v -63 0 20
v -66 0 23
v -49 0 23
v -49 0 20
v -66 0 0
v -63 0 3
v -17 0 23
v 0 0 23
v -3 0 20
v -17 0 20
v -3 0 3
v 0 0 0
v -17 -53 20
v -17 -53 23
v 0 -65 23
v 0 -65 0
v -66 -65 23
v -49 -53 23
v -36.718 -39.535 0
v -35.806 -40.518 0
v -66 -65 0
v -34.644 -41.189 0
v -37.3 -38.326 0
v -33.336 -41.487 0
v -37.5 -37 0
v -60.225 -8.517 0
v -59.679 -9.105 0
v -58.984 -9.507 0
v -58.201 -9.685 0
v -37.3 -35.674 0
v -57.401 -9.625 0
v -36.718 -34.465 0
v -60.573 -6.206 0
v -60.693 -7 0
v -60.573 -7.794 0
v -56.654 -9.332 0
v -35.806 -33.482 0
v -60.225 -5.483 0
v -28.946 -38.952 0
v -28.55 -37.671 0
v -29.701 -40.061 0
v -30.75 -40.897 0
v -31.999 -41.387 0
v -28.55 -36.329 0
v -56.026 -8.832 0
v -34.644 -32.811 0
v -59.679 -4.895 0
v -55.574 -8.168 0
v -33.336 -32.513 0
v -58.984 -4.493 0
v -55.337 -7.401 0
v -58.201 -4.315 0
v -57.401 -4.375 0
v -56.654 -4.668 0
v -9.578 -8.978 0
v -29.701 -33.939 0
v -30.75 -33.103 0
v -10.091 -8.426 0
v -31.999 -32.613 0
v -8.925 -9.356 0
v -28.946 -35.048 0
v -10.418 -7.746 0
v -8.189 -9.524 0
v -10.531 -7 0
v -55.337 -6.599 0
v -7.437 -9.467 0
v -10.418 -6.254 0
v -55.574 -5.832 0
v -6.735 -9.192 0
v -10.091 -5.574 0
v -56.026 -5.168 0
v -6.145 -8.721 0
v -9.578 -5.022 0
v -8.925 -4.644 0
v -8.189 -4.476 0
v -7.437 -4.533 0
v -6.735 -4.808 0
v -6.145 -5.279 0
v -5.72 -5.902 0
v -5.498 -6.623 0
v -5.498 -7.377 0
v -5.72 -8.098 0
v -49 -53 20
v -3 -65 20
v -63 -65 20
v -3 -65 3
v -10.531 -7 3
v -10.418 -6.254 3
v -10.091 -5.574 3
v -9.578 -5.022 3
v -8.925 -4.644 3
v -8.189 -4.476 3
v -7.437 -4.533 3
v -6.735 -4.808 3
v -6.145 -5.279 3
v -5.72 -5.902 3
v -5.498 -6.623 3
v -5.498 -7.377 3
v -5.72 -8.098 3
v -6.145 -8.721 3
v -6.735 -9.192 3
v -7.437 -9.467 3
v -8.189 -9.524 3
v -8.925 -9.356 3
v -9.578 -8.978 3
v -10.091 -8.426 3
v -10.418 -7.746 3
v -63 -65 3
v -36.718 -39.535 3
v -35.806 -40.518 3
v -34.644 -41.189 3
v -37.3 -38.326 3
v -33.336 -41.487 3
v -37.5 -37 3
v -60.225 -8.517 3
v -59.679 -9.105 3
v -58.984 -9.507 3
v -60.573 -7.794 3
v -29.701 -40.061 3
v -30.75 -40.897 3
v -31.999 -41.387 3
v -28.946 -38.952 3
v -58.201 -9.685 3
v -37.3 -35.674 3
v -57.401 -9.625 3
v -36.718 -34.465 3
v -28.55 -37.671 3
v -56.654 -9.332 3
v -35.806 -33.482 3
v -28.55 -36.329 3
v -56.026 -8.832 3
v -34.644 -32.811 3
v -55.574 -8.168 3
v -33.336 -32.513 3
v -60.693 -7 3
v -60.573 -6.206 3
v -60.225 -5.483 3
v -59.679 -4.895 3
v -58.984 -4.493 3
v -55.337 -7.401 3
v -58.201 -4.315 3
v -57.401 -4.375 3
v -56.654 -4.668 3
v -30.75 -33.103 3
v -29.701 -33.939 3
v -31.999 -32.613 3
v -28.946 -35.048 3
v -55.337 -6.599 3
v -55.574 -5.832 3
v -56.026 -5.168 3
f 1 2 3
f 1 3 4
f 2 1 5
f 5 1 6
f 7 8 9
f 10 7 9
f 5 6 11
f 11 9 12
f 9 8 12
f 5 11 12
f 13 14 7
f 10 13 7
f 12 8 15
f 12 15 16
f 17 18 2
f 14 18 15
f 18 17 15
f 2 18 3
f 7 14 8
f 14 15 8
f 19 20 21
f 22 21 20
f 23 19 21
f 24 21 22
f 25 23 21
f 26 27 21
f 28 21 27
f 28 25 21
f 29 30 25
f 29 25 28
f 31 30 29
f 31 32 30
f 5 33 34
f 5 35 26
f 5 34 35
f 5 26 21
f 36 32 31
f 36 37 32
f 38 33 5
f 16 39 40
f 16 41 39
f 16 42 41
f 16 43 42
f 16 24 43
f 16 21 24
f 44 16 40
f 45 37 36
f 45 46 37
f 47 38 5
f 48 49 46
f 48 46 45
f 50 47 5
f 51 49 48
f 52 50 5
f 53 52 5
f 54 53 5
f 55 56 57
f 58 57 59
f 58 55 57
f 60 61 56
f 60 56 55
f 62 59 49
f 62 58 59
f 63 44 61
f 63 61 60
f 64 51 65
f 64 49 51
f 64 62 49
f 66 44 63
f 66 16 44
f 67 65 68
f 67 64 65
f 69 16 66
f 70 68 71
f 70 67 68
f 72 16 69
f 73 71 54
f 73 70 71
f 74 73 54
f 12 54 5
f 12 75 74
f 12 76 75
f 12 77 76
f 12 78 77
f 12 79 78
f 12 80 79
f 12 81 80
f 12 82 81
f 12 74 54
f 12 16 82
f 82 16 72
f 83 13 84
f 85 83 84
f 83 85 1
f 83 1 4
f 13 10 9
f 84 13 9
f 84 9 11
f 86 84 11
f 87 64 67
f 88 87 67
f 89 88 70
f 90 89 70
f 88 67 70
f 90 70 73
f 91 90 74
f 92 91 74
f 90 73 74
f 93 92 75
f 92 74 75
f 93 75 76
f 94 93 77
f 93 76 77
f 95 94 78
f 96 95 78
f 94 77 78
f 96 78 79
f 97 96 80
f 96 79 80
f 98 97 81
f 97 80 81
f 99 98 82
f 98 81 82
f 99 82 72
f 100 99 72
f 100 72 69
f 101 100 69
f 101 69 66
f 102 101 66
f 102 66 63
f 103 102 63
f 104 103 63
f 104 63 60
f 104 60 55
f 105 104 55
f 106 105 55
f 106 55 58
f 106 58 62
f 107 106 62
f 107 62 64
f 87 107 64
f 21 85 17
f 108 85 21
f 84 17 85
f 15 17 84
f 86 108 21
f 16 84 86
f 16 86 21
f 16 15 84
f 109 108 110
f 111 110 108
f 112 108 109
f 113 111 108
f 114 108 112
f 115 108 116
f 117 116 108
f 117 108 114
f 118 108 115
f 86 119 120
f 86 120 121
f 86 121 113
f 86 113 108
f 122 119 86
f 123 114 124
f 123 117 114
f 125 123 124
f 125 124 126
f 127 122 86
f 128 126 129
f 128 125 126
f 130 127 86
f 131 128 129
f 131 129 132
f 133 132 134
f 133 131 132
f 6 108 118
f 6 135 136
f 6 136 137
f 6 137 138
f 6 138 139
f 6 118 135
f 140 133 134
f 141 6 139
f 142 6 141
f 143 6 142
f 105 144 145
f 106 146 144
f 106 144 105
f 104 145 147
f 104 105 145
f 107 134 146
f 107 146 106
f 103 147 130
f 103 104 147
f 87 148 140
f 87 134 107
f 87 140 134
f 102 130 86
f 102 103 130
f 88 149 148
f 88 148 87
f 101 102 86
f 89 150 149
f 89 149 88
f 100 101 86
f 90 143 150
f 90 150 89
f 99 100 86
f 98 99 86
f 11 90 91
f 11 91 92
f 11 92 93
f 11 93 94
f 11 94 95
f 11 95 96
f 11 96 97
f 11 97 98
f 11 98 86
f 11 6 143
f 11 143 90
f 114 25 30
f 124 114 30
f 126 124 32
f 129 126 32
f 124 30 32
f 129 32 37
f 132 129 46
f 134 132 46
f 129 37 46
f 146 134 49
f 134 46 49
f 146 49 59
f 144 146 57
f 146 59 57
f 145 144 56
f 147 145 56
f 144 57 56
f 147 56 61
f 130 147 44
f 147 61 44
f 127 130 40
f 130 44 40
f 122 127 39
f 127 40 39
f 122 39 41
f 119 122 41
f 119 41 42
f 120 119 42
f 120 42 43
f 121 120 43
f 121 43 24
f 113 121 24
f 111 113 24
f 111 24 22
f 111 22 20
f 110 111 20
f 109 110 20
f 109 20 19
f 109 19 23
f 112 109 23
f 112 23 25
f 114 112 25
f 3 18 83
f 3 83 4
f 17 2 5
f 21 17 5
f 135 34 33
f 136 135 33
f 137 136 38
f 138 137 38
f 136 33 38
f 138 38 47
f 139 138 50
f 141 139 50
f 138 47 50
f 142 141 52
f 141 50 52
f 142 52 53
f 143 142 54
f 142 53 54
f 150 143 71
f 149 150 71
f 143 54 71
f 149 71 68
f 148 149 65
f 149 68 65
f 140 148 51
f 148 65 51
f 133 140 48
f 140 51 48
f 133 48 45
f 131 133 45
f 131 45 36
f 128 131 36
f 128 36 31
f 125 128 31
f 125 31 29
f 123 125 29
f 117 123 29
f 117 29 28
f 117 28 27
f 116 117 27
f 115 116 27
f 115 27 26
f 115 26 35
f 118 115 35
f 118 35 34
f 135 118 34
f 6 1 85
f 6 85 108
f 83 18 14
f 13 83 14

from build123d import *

# Parameters (mm, degrees)
SKETCH1_W           = 23
SKETCH1_H           = 65
BOSS_EXTRUDE1_DEPTH = 66
SKETCH2_W           = 60
SKETCH2_H           = 17
CUT_EXTRUDE1_DEPTH  = 66
CUT_EXTRUDE2_REACH  = 25
SKETCH3_W           = 32
SKETCH3_H           = 53
CUT_EXTRUDE3_REACH  = 25
SKETCH5_R           = 4.5
SKETCH5_R_2         = 2.530586218
SKETCH5_R_3         = 2.69284222


with BuildPart() as part:
    # Sketch1 → Boss-Extrude1 (new body)
    with BuildSketch(Plane(origin=(0, 0, 0), x_dir=(0, 0, -1), z_dir=(1, 0, 0))):
        with Locations((-11.5, -32.5)):
            Rectangle(SKETCH1_W, SKETCH1_H)
    extrude(amount=-BOSS_EXTRUDE1_DEPTH)

    # Sketch2 → Cut-Extrude1 (cut, through all)
    with BuildSketch(Plane(origin=(0, 0, 0), x_dir=(1, 0, 0), z_dir=(0, 1, 0))):
        with Locations((-33, -11.5)):
            Rectangle(SKETCH2_W, SKETCH2_H)
    extrude(amount=-CUT_EXTRUDE1_DEPTH, mode=Mode.SUBTRACT)

    # Sketch3 → Cut-Extrude2 (cut, up to next)
    with BuildSketch(Plane.XY.offset(23), mode=Mode.PRIVATE) as cut_extrude2_sk1:
        with Locations((-33, -26.5)):
            Rectangle(SKETCH3_W, SKETCH3_H)
    cut_extrude2_tool1 = extrude(cut_extrude2_sk1.sketch, amount=-CUT_EXTRUDE2_REACH, mode=Mode.PRIVATE) & part.part
    add(cut_extrude2_tool1.solids().sort_by_distance((-33, -26.5, 23))[0], mode=Mode.SUBTRACT)

    # Sketch5 → Cut-Extrude3 (cut, up to next)
    with BuildSketch(Plane(origin=(0, 0, 0), x_dir=(-1, 0, 0), z_dir=(0, 0, -1)), mode=Mode.PRIVATE) as cut_extrude3_sk1:
        with Locations((33, -37)):
            Circle(SKETCH5_R)
    cut_extrude3_tool1 = extrude(cut_extrude3_sk1.sketch, amount=-CUT_EXTRUDE3_REACH, mode=Mode.PRIVATE) & part.part
    add(cut_extrude3_tool1.solids().sort_by_distance((-33, -37, 0))[0], mode=Mode.SUBTRACT)
    # Sketch5 → Cut-Extrude3 (cut, up to next)
    with BuildSketch(Plane(origin=(0, 0, 0), x_dir=(-1, 0, 0), z_dir=(0, 0, -1)), mode=Mode.PRIVATE) as cut_extrude3_sk2:
        with Locations((8, -7)):
            Circle(SKETCH5_R_2)
    cut_extrude3_tool2 = extrude(cut_extrude3_sk2.sketch, amount=-CUT_EXTRUDE3_REACH, mode=Mode.PRIVATE) & part.part
    add(cut_extrude3_tool2.solids().sort_by_distance((-8, -7, 0))[0], mode=Mode.SUBTRACT)
    # Sketch5 → Cut-Extrude3 (cut, up to next)
    with BuildSketch(Plane(origin=(0, 0, 0), x_dir=(-1, 0, 0), z_dir=(0, 0, -1)), mode=Mode.PRIVATE) as cut_extrude3_sk3:
        with Locations((58, -7)):
            Circle(SKETCH5_R_3)
    cut_extrude3_tool3 = extrude(cut_extrude3_sk3.sketch, amount=-CUT_EXTRUDE3_REACH, mode=Mode.PRIVATE) & part.part
    add(cut_extrude3_tool3.solids().sort_by_distance((-58, -7, 0))[0], mode=Mode.SUBTRACT)


solid = part.part
